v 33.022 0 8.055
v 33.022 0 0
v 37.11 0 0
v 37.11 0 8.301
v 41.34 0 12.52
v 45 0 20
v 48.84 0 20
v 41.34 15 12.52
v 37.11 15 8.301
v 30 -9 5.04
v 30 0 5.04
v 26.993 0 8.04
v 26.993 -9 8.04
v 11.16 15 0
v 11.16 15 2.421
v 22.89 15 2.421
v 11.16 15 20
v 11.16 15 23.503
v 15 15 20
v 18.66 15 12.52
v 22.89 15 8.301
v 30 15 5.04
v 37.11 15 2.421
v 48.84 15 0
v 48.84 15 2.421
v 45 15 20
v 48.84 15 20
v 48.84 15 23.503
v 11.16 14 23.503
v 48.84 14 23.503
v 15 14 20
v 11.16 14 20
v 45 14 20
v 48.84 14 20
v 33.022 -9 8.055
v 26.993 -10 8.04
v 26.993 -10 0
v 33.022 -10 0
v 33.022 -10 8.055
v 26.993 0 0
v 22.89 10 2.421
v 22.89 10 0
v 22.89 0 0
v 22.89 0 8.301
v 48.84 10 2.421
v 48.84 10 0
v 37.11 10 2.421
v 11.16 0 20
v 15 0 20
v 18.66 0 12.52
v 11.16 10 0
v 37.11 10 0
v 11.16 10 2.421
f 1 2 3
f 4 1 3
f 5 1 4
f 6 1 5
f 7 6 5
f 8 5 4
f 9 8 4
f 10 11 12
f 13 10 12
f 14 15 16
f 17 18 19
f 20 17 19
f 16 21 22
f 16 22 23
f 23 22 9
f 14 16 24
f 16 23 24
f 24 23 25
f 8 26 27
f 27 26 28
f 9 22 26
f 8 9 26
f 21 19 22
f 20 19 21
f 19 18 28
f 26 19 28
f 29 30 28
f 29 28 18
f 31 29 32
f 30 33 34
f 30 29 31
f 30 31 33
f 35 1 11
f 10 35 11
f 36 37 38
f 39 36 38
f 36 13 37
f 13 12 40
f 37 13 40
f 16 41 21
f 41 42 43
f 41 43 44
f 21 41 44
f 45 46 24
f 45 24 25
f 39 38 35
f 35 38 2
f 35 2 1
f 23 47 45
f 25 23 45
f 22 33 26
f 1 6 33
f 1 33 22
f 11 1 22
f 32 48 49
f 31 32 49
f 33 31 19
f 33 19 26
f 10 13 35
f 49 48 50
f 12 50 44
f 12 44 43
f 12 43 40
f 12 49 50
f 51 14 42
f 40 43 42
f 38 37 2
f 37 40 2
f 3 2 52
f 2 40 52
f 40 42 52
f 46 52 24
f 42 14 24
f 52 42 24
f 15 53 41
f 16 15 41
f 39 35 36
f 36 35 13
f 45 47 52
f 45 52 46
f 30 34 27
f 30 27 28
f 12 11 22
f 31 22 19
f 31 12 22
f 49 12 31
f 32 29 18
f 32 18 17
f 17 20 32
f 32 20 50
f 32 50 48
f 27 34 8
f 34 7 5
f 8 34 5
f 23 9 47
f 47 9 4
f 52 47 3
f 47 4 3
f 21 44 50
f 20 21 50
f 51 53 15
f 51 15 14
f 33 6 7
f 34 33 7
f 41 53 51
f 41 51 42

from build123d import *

# Parameters (mm, degrees)
F1_DEPTH  = 15
F3_DEPTH  = 15
F4_DEPTH  = 10
F5_DEPTH  = 15
F6_DEPTH  = 14
F8_DEPTH  = 9
F9_DEPTH  = 11.1596047133
F10_DEPTH = 11.1596047133
F12_DEPTH = 1


with BuildPart() as f1:
    # F0 (on Front) → F1 (new body)
    with BuildSketch(Plane.XZ):
        Polygon((0, 20), (0, 0), (60, 0), (60, 20), (45, 20), (30, 5.0404220819), (15, 20), align=None)
    extrude(amount=-F1_DEPTH)

    # F2 (on face) → F3 (cut, through all)
    with BuildSketch(Plane.XZ):
        Polygon((18.6596047133, 2.4207425304), (22.8898393214, 2.4207425304), (22.8898393214, 8.3013760923), (18.6596047133, 12.520211041), (14.3979182423, 16.770413096), (11.1596047133, 20), (0, 20), (0, 2.4207425304), align=None)
        Polygon((37.1101606786, 2.4207425304), (41.3403952867, 2.4207425304), (60, 2.4207425304), (60, 20), (48.8403952867, 20), (45.6020817577, 16.770413096), (41.3403952867, 12.520211041), (37.1101606786, 8.3013760923), align=None)
    extrude(amount=-F3_DEPTH, mode=Mode.SUBTRACT)

    # F2 (on face) → F4 (cut)
    with BuildSketch(Plane.XZ):
        Polygon((0, 0), (22.8898393214, 0), (22.8898393214, 2.4207425304), (18.6596047133, 2.4207425304), (0, 2.4207425304), align=None)
        Polygon((60, 2.4207425304), (41.3403952867, 2.4207425304), (37.1101606786, 2.4207425304), (37.1101606786, 0), (60, 0), align=None)
    extrude(amount=-F4_DEPTH, mode=Mode.SUBTRACT)

    # F2 (on face) → F5 (join, through all)
    with BuildSketch(Plane.XZ):
        Polygon((45, 20), (48.8403952867, 20), (48.8403952867, 23.5034972429), (15, 23.5034972429), (11.1596047133, 23.5034972429), (11.1596047133, 20), (15, 20), align=None)
    extrude(amount=-F5_DEPTH)

    # F2 (on face) → F6 (cut)
    with BuildSketch(Plane.XZ):
        Polygon((45, 20), (48.8403952867, 20), (48.8403952867, 23.5034972429), (15, 23.5034972429), (11.1596047133, 23.5034972429), (11.1596047133, 20), (15, 20), align=None)
    extrude(amount=-F6_DEPTH, mode=Mode.SUBTRACT)

    # F7 (on face) → F8 (join)
    with BuildSketch(Plane.XZ):
        Polygon((26.9925054163, 0), (29.0075894445, 0), (31.0043748468, 0), (33.0223664641, 0), (33.0223664641, 5.0404220819), (33.0223664641, 8.0546438564), (30, 5.0404220819), (26.9925054163, 8.0398120528), (26.9925054163, 6.030158284), align=None)
    extrude(amount=F8_DEPTH)

    # F9 (cut, through all): a face of the model
    f9_faces = [f1.faces().sort_by_distance(p)[0] for p in [
        (0, 12.5, 1.2103712652),
    ]]
    extrude(f9_faces, amount=-F9_DEPTH, mode=Mode.SUBTRACT)

    # F10 (cut, through all): a face of the model
    f10_faces = [f1.faces().sort_by_distance(p)[0] for p in [
        (60, 12.5, 1.2103712652),
    ]]
    extrude(f10_faces, amount=-F10_DEPTH, mode=Mode.SUBTRACT)

    # F11 (on face) → F12 (join)
    with BuildSketch(Plane.XZ.offset(9)):
        Polygon((33.0223664641, 8.0546438564), (26.9925054163, 8.0398120528), (30, 5.0404220819), align=None)
        Polygon((30, 5.0404220819), (26.9925054163, 8.0398120528), (26.9925054163, 0), (33.0223664641, 0), (33.0223664641, 8.0546438564), align=None)
    extrude(amount=F12_DEPTH)


solid = f1.part
